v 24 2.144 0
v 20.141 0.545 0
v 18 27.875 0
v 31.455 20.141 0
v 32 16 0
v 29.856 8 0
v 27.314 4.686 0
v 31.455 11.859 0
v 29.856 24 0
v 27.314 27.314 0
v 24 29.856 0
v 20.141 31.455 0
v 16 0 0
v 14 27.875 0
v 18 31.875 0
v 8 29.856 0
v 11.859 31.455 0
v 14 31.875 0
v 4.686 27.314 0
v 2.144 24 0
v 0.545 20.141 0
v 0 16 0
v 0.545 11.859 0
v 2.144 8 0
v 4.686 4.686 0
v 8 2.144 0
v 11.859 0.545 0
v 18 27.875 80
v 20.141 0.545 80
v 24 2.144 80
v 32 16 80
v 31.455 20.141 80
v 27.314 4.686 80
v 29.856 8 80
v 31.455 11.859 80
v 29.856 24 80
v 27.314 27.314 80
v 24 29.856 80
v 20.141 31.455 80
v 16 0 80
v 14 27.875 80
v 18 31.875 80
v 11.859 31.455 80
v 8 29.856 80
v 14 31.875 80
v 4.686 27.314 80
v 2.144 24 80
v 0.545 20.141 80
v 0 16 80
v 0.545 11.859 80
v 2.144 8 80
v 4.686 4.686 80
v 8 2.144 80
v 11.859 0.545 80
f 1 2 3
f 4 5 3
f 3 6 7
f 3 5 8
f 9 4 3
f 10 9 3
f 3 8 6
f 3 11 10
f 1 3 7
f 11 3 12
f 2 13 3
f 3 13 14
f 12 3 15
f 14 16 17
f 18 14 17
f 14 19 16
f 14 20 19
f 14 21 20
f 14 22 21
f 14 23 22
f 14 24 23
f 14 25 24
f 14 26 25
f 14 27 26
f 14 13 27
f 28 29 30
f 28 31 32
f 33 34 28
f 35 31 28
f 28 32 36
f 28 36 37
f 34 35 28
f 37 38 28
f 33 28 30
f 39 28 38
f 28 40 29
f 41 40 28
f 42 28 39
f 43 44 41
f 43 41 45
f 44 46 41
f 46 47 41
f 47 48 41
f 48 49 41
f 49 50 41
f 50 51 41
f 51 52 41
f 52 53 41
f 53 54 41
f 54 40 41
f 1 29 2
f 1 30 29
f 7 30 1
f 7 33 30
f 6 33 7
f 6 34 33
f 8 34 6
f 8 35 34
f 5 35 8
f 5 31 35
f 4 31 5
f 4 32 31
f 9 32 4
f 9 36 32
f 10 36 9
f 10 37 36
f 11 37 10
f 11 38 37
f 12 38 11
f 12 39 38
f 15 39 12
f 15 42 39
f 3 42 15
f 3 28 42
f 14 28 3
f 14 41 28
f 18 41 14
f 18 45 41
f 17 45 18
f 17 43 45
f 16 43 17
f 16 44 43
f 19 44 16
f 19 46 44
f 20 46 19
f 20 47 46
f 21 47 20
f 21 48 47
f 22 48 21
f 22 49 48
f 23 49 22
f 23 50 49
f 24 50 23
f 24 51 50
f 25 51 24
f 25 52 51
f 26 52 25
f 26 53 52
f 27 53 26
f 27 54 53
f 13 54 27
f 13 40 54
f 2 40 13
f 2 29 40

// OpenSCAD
$fn = 32;

// ----------------------------------------------------------------------
// Keyway shaft: d32 shaft, key 4 x 4 mm
// ----------------------------------------------------------------------

// --- parameters (mm) ---
shaft_r = 16;             // shaft radius
key_w = 4;                // keyway width
key_d = 4;                // keyway depth below the surface line
plate_t = 80;             // shaft length, Z (extrusion height)

shaft_d = 2 * shaft_r;  // shaft diameter
circle_step = 15;  // polygon sampling step, degrees

profile = [[11.859, 31.455], [8, 29.856], [4.686, 27.314], [2.144, 24], [0.545, 20.141], [0, 16], [0.545, 11.859], [2.144, 8], [4.686, 4.686], [8, 2.144], [11.859, 0.545], [16, 0], [20.141, 0.545], [24, 2.144], [27.314, 4.686], [29.856, 8], [31.455, 11.859], [32, 16], [31.455, 20.141], [29.856, 24], [27.314, 27.314], [24, 29.856], [20.141, 31.455], [18, 31.875], [18, 27.875], [14, 27.875], [14, 31.875]];  // primary outline, 27 points, counter clockwise

// --- the one profile operation ---
linear_extrude(height = plate_t) polygon(points = profile);
